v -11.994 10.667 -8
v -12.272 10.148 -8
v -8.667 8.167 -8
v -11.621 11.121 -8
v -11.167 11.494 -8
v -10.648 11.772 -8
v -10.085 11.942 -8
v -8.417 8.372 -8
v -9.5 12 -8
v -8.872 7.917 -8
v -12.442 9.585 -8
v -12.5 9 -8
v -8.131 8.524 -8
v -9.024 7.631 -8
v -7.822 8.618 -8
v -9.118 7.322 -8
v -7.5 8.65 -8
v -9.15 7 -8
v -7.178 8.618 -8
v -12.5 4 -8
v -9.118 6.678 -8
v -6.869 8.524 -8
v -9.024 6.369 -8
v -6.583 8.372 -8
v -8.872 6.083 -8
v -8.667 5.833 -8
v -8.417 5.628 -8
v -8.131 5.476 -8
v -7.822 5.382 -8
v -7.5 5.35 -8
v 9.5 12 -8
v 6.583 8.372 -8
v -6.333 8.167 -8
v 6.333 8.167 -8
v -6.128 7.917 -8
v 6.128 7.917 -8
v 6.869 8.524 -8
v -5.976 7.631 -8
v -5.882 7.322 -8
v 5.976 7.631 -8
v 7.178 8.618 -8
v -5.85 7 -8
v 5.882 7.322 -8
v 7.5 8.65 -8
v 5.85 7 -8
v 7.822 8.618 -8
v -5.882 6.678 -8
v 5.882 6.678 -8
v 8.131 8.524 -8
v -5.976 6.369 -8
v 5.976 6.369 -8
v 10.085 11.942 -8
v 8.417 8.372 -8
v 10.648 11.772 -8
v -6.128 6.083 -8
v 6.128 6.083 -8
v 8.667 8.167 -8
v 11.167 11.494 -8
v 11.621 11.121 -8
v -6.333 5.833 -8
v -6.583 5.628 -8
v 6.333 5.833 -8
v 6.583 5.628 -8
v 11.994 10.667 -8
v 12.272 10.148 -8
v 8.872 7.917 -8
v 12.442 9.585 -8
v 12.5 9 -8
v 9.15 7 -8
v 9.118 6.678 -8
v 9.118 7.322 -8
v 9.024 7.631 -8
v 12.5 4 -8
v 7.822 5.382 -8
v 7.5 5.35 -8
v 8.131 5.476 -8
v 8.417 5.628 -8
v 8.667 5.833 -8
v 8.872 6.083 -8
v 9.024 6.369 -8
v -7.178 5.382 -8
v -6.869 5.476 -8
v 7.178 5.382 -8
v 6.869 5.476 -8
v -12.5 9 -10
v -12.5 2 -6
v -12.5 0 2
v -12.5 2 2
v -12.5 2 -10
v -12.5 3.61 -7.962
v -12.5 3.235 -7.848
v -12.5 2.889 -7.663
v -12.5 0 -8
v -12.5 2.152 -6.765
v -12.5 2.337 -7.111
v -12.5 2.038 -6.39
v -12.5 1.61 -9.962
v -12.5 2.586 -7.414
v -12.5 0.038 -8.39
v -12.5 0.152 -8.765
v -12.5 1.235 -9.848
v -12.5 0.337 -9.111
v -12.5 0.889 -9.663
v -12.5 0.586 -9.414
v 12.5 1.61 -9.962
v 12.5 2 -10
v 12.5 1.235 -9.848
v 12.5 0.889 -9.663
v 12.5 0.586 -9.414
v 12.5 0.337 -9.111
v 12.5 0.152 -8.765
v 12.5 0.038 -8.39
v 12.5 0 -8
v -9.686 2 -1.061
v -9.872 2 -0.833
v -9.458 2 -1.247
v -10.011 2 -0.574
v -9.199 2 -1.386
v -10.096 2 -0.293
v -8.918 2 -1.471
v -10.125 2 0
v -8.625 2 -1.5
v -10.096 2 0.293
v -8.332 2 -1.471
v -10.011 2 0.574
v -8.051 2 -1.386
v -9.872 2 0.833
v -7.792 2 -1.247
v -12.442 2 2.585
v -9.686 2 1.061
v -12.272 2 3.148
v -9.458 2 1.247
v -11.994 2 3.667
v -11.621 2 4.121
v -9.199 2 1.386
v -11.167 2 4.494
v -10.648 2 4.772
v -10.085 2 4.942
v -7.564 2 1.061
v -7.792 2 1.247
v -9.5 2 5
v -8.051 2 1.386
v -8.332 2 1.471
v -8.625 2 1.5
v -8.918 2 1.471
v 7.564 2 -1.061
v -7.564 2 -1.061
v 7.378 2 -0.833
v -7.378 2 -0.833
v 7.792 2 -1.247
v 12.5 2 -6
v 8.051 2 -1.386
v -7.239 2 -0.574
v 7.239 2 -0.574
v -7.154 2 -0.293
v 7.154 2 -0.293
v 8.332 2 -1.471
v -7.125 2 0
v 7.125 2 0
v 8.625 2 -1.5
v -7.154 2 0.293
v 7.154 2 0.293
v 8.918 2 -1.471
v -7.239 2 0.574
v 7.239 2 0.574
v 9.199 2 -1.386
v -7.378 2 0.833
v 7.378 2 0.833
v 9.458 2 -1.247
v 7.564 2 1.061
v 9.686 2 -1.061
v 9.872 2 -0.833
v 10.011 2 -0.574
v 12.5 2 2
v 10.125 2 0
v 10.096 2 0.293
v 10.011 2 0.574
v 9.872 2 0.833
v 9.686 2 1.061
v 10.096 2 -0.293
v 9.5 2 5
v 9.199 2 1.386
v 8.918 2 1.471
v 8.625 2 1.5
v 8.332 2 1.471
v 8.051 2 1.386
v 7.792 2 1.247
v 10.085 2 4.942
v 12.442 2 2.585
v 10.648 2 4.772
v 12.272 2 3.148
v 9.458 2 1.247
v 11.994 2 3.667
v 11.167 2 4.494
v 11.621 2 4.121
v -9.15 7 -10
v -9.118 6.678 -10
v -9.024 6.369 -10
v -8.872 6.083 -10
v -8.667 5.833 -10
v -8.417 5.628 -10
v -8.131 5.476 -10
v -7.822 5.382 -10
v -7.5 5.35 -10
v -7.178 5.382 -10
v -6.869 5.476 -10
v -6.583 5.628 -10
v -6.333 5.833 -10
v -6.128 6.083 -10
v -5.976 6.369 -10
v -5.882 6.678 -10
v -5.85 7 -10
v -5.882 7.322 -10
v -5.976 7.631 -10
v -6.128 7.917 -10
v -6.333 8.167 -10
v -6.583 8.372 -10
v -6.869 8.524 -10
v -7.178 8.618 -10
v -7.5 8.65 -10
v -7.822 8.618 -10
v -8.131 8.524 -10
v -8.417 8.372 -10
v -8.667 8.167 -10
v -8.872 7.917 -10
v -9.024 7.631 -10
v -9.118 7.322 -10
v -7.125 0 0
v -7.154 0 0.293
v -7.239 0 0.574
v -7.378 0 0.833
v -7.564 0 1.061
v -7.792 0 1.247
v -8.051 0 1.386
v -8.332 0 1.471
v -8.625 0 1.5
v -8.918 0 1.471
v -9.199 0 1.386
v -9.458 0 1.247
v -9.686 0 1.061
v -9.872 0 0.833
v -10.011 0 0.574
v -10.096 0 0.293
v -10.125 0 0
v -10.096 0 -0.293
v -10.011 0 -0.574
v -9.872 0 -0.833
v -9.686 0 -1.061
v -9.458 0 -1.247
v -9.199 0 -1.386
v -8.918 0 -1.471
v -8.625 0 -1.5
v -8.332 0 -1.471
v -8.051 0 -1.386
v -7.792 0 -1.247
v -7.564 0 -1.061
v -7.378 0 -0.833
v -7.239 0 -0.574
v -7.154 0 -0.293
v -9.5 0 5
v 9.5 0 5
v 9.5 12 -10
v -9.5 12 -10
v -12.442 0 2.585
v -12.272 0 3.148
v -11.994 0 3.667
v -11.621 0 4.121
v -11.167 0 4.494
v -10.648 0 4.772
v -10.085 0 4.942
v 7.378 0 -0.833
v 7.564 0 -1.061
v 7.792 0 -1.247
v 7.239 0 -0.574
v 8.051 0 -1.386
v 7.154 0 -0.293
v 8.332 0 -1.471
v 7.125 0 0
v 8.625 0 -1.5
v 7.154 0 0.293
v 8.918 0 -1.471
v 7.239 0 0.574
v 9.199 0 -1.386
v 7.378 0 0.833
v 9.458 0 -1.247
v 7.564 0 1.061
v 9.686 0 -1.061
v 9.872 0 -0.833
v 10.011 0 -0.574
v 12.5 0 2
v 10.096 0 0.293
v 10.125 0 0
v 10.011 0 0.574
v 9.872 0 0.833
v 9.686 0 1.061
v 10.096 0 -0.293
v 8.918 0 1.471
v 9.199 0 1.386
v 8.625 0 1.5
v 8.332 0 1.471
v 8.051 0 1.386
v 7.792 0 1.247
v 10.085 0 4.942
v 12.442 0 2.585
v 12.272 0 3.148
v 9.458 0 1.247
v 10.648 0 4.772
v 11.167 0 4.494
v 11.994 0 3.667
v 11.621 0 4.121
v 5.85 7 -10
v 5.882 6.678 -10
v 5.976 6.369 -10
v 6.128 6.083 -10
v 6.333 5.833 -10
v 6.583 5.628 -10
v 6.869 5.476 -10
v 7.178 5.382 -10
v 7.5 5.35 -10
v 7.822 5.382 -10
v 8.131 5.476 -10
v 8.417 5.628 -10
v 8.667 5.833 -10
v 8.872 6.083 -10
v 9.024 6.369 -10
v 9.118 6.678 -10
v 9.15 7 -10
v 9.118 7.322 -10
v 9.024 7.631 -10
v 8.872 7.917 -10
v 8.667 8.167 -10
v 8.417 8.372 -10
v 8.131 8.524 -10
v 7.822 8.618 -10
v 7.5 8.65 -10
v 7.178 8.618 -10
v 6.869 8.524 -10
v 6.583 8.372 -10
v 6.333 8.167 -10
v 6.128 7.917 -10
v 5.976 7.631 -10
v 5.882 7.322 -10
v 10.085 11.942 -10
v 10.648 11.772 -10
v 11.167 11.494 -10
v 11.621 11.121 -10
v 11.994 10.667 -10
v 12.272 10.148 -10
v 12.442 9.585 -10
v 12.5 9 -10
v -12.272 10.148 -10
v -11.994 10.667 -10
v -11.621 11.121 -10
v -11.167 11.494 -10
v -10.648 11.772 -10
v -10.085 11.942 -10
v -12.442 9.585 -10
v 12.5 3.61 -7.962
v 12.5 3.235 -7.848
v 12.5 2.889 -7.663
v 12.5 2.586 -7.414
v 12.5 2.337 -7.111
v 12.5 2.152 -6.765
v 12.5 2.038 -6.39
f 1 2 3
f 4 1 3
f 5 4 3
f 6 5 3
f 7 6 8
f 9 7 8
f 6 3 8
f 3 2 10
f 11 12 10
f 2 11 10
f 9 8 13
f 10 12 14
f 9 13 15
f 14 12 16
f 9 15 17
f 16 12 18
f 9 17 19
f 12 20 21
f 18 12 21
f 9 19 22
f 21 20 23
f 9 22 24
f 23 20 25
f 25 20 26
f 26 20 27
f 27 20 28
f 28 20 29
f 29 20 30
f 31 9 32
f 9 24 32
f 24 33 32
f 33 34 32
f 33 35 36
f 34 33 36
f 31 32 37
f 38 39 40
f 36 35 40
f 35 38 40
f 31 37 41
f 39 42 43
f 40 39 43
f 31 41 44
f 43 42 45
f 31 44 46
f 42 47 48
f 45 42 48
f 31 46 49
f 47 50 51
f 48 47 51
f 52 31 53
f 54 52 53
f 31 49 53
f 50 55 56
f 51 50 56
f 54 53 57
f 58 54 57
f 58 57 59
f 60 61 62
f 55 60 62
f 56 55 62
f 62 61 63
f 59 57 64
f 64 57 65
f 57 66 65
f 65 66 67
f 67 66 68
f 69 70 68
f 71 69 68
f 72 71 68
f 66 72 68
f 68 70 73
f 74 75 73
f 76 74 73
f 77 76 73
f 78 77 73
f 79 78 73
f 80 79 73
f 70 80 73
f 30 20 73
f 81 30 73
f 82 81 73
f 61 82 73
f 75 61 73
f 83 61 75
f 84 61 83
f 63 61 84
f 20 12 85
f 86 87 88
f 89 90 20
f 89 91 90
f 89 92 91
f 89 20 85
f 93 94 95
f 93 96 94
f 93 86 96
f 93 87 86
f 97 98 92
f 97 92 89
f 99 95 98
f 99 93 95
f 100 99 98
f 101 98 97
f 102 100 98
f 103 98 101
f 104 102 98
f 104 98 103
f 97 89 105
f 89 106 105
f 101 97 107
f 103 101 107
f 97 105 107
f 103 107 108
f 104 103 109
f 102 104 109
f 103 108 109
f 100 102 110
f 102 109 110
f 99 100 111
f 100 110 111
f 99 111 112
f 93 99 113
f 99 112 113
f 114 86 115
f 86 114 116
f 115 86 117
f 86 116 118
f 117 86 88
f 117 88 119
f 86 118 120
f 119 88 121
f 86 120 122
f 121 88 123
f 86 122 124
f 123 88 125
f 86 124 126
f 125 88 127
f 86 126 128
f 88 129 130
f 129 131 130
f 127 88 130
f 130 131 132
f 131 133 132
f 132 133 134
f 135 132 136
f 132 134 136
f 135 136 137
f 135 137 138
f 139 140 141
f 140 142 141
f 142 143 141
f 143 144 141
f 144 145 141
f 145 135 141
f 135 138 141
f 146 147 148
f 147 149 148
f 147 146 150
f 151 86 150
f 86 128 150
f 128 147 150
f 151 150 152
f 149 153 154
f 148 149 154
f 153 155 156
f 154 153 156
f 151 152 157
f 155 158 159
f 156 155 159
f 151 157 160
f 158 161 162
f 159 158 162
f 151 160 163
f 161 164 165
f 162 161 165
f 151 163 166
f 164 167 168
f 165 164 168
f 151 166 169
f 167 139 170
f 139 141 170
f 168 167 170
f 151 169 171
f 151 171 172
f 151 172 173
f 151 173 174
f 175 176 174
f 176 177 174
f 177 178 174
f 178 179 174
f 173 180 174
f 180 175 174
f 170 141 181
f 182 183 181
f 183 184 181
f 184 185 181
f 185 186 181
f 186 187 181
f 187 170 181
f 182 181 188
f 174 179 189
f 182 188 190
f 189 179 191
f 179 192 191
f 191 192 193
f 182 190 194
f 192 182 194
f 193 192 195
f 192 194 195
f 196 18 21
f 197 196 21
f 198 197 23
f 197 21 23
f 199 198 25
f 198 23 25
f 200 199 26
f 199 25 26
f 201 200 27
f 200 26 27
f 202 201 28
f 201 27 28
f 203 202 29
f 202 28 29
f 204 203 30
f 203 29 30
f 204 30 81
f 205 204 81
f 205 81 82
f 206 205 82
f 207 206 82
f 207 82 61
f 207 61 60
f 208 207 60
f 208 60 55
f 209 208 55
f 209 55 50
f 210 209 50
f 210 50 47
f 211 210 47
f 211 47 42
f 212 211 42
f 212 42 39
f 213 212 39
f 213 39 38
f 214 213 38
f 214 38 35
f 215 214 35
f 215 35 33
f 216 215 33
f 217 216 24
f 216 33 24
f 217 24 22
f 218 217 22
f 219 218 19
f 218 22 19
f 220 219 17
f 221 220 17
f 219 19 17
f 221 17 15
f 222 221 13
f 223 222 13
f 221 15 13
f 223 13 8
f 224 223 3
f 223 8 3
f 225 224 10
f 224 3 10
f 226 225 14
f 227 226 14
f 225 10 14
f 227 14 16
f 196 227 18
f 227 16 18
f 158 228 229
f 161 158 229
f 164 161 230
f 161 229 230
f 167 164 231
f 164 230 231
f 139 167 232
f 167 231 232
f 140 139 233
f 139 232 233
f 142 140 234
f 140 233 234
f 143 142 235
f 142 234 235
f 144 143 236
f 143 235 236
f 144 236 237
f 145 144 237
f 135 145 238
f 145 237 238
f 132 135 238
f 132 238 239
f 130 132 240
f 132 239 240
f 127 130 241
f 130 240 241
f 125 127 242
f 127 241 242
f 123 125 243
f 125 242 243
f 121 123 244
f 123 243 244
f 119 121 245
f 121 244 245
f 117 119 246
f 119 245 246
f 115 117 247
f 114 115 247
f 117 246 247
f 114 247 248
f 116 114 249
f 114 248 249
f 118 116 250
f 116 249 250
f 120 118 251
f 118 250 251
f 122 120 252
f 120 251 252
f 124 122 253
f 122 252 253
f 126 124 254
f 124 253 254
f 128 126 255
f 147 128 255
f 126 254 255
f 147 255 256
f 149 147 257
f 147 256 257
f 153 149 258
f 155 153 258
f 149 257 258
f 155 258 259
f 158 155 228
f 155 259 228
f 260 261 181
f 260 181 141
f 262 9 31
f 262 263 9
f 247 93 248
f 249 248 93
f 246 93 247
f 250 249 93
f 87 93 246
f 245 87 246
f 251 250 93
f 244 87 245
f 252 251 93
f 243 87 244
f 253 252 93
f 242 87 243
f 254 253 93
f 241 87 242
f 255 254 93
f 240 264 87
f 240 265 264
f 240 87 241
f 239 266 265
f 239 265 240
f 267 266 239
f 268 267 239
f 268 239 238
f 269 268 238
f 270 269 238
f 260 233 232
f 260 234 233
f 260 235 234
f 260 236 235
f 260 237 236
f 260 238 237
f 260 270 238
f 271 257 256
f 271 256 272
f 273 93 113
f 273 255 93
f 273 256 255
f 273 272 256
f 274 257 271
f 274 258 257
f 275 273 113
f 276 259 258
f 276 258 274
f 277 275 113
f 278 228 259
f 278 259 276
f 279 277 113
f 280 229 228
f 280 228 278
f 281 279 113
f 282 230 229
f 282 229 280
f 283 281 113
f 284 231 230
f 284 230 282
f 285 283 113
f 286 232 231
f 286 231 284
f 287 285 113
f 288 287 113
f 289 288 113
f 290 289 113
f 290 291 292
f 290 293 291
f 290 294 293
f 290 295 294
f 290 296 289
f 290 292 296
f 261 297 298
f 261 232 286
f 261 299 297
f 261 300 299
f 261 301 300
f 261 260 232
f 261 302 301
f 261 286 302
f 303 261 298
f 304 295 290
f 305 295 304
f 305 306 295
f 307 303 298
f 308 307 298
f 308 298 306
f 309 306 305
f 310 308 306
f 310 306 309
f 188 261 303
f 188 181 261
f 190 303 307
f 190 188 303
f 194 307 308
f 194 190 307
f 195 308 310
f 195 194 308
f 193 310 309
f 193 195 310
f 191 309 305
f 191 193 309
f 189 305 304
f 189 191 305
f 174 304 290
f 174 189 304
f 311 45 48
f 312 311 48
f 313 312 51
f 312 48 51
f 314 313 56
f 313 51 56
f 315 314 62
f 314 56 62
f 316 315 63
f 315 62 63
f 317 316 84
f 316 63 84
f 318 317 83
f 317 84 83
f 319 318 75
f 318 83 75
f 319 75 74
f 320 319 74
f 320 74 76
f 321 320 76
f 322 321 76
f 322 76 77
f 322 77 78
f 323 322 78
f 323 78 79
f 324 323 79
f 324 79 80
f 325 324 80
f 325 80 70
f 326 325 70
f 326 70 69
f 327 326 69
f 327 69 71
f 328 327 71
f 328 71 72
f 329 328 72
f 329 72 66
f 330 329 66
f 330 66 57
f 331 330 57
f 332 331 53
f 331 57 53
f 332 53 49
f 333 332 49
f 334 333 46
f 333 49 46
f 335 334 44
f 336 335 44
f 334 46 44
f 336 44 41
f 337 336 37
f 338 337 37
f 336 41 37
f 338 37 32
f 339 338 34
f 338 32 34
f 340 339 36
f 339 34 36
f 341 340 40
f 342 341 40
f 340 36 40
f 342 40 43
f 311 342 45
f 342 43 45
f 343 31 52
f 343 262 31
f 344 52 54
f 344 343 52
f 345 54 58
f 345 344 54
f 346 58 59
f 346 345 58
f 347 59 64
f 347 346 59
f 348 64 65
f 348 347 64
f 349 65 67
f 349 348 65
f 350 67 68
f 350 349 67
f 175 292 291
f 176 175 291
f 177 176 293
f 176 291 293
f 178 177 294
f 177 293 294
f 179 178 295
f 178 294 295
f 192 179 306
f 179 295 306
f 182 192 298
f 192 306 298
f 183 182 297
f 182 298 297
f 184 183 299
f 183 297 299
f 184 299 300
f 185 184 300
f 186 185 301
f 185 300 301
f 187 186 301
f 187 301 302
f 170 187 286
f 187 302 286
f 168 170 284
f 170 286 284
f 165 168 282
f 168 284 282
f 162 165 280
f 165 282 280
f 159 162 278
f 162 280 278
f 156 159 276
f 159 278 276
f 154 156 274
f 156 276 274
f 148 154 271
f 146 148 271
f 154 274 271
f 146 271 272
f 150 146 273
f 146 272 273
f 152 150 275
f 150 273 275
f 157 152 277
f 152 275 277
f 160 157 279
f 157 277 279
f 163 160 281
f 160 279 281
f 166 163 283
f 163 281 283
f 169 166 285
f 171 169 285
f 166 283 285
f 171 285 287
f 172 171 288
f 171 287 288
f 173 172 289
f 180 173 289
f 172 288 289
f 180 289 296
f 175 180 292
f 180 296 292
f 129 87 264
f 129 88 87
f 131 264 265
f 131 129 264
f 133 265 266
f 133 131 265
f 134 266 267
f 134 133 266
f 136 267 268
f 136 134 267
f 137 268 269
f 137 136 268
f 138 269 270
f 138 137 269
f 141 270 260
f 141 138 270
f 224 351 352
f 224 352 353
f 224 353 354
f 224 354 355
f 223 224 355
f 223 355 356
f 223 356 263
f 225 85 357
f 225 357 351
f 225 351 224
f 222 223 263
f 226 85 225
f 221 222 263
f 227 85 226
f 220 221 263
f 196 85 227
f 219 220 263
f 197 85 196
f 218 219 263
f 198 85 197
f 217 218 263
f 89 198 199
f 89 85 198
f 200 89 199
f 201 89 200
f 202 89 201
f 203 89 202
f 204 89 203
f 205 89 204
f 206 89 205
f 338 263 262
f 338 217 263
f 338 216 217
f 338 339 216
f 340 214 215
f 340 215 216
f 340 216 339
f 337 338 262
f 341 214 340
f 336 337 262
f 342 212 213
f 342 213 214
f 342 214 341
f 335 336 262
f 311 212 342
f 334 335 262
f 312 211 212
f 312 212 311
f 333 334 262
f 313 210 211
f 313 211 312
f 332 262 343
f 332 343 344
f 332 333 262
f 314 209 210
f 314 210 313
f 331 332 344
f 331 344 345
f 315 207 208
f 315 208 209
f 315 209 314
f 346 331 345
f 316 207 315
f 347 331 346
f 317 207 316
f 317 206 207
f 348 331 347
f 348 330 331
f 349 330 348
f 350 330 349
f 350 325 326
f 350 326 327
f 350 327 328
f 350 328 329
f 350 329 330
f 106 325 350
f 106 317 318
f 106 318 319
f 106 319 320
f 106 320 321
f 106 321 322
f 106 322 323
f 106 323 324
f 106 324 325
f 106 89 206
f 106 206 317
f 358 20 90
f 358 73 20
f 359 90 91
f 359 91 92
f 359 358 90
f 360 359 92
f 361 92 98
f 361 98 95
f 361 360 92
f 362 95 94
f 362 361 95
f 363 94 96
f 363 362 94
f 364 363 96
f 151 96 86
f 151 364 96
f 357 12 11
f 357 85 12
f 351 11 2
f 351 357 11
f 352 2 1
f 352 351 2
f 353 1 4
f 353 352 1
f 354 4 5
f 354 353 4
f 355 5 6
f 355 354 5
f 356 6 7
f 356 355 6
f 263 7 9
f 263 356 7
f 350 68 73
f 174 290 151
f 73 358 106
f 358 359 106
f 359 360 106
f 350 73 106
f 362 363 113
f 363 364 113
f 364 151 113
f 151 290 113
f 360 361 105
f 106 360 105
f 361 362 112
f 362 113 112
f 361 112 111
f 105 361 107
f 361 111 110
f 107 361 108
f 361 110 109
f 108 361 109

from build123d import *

# Parameters (mm, degrees)
SKETCH_R     = 1.5
PAD_DEPTH    = 2
SKETCH001_W  = 25
SKETCH001_H  = 2
PAD001_DEPTH = 10
SKETCH002_R  = 1.65
POCKET_DEPTH = 2.001
FILLET_R     = 2
FILLET001_R  = 3


with BuildPart() as part:
    # Sketch → Pad (new body)
    with BuildSketch(Plane.XZ):
        Polygon((-12.5, 5), (-12.5, -5), (-12.5, -10), (12.5, -10), (12.5, -5), (12.5, 5), align=None)
        with Locations((-8.625, 0)):
            Circle(SKETCH_R, mode=Mode.SUBTRACT)
        with Locations((8.625, 0)):
            Circle(SKETCH_R, mode=Mode.SUBTRACT)
    extrude(amount=-PAD_DEPTH)

    # Sketch001 (on Face6 of Pad) → Pad001 (join)
    with BuildSketch(Plane(origin=(0, 2, 0), x_dir=(1, 0, 0), z_dir=(0, 1, 0))):
        with Locations((0, 9)):
            Rectangle(SKETCH001_W, SKETCH001_H)
    extrude(amount=PAD001_DEPTH)

    # Sketch002 (on Face6 of Pad001) → Pocket (cut, through all)
    with BuildSketch(Plane(origin=(0, 0, -8), x_dir=(-1, 0, 0), z_dir=(0, 0, 1))):
        with Locations((-7.5, -7)):
            Circle(SKETCH002_R)
        with Locations((7.5, -7)):
            Circle(SKETCH002_R)
    extrude(amount=-POCKET_DEPTH, mode=Mode.SUBTRACT)

    # Fillet
    fillet_edges = [part.edges().sort_by_distance(p)[0] for p in [
        (0, 2, -8),
        (0, 0, -10),
    ]]
    fillet(fillet_edges, radius=FILLET_R)

    # Fillet001
    fillet001_edges = [part.edges().sort_by_distance(p)[0] for p in [
        (-12.5, 1, 5),
        (12.5, 1, 5),
        (12.5, 12, -9),
        (-12.5, 12, -9),
    ]]
    fillet(fillet001_edges, radius=FILLET001_R)


solid = part.part
